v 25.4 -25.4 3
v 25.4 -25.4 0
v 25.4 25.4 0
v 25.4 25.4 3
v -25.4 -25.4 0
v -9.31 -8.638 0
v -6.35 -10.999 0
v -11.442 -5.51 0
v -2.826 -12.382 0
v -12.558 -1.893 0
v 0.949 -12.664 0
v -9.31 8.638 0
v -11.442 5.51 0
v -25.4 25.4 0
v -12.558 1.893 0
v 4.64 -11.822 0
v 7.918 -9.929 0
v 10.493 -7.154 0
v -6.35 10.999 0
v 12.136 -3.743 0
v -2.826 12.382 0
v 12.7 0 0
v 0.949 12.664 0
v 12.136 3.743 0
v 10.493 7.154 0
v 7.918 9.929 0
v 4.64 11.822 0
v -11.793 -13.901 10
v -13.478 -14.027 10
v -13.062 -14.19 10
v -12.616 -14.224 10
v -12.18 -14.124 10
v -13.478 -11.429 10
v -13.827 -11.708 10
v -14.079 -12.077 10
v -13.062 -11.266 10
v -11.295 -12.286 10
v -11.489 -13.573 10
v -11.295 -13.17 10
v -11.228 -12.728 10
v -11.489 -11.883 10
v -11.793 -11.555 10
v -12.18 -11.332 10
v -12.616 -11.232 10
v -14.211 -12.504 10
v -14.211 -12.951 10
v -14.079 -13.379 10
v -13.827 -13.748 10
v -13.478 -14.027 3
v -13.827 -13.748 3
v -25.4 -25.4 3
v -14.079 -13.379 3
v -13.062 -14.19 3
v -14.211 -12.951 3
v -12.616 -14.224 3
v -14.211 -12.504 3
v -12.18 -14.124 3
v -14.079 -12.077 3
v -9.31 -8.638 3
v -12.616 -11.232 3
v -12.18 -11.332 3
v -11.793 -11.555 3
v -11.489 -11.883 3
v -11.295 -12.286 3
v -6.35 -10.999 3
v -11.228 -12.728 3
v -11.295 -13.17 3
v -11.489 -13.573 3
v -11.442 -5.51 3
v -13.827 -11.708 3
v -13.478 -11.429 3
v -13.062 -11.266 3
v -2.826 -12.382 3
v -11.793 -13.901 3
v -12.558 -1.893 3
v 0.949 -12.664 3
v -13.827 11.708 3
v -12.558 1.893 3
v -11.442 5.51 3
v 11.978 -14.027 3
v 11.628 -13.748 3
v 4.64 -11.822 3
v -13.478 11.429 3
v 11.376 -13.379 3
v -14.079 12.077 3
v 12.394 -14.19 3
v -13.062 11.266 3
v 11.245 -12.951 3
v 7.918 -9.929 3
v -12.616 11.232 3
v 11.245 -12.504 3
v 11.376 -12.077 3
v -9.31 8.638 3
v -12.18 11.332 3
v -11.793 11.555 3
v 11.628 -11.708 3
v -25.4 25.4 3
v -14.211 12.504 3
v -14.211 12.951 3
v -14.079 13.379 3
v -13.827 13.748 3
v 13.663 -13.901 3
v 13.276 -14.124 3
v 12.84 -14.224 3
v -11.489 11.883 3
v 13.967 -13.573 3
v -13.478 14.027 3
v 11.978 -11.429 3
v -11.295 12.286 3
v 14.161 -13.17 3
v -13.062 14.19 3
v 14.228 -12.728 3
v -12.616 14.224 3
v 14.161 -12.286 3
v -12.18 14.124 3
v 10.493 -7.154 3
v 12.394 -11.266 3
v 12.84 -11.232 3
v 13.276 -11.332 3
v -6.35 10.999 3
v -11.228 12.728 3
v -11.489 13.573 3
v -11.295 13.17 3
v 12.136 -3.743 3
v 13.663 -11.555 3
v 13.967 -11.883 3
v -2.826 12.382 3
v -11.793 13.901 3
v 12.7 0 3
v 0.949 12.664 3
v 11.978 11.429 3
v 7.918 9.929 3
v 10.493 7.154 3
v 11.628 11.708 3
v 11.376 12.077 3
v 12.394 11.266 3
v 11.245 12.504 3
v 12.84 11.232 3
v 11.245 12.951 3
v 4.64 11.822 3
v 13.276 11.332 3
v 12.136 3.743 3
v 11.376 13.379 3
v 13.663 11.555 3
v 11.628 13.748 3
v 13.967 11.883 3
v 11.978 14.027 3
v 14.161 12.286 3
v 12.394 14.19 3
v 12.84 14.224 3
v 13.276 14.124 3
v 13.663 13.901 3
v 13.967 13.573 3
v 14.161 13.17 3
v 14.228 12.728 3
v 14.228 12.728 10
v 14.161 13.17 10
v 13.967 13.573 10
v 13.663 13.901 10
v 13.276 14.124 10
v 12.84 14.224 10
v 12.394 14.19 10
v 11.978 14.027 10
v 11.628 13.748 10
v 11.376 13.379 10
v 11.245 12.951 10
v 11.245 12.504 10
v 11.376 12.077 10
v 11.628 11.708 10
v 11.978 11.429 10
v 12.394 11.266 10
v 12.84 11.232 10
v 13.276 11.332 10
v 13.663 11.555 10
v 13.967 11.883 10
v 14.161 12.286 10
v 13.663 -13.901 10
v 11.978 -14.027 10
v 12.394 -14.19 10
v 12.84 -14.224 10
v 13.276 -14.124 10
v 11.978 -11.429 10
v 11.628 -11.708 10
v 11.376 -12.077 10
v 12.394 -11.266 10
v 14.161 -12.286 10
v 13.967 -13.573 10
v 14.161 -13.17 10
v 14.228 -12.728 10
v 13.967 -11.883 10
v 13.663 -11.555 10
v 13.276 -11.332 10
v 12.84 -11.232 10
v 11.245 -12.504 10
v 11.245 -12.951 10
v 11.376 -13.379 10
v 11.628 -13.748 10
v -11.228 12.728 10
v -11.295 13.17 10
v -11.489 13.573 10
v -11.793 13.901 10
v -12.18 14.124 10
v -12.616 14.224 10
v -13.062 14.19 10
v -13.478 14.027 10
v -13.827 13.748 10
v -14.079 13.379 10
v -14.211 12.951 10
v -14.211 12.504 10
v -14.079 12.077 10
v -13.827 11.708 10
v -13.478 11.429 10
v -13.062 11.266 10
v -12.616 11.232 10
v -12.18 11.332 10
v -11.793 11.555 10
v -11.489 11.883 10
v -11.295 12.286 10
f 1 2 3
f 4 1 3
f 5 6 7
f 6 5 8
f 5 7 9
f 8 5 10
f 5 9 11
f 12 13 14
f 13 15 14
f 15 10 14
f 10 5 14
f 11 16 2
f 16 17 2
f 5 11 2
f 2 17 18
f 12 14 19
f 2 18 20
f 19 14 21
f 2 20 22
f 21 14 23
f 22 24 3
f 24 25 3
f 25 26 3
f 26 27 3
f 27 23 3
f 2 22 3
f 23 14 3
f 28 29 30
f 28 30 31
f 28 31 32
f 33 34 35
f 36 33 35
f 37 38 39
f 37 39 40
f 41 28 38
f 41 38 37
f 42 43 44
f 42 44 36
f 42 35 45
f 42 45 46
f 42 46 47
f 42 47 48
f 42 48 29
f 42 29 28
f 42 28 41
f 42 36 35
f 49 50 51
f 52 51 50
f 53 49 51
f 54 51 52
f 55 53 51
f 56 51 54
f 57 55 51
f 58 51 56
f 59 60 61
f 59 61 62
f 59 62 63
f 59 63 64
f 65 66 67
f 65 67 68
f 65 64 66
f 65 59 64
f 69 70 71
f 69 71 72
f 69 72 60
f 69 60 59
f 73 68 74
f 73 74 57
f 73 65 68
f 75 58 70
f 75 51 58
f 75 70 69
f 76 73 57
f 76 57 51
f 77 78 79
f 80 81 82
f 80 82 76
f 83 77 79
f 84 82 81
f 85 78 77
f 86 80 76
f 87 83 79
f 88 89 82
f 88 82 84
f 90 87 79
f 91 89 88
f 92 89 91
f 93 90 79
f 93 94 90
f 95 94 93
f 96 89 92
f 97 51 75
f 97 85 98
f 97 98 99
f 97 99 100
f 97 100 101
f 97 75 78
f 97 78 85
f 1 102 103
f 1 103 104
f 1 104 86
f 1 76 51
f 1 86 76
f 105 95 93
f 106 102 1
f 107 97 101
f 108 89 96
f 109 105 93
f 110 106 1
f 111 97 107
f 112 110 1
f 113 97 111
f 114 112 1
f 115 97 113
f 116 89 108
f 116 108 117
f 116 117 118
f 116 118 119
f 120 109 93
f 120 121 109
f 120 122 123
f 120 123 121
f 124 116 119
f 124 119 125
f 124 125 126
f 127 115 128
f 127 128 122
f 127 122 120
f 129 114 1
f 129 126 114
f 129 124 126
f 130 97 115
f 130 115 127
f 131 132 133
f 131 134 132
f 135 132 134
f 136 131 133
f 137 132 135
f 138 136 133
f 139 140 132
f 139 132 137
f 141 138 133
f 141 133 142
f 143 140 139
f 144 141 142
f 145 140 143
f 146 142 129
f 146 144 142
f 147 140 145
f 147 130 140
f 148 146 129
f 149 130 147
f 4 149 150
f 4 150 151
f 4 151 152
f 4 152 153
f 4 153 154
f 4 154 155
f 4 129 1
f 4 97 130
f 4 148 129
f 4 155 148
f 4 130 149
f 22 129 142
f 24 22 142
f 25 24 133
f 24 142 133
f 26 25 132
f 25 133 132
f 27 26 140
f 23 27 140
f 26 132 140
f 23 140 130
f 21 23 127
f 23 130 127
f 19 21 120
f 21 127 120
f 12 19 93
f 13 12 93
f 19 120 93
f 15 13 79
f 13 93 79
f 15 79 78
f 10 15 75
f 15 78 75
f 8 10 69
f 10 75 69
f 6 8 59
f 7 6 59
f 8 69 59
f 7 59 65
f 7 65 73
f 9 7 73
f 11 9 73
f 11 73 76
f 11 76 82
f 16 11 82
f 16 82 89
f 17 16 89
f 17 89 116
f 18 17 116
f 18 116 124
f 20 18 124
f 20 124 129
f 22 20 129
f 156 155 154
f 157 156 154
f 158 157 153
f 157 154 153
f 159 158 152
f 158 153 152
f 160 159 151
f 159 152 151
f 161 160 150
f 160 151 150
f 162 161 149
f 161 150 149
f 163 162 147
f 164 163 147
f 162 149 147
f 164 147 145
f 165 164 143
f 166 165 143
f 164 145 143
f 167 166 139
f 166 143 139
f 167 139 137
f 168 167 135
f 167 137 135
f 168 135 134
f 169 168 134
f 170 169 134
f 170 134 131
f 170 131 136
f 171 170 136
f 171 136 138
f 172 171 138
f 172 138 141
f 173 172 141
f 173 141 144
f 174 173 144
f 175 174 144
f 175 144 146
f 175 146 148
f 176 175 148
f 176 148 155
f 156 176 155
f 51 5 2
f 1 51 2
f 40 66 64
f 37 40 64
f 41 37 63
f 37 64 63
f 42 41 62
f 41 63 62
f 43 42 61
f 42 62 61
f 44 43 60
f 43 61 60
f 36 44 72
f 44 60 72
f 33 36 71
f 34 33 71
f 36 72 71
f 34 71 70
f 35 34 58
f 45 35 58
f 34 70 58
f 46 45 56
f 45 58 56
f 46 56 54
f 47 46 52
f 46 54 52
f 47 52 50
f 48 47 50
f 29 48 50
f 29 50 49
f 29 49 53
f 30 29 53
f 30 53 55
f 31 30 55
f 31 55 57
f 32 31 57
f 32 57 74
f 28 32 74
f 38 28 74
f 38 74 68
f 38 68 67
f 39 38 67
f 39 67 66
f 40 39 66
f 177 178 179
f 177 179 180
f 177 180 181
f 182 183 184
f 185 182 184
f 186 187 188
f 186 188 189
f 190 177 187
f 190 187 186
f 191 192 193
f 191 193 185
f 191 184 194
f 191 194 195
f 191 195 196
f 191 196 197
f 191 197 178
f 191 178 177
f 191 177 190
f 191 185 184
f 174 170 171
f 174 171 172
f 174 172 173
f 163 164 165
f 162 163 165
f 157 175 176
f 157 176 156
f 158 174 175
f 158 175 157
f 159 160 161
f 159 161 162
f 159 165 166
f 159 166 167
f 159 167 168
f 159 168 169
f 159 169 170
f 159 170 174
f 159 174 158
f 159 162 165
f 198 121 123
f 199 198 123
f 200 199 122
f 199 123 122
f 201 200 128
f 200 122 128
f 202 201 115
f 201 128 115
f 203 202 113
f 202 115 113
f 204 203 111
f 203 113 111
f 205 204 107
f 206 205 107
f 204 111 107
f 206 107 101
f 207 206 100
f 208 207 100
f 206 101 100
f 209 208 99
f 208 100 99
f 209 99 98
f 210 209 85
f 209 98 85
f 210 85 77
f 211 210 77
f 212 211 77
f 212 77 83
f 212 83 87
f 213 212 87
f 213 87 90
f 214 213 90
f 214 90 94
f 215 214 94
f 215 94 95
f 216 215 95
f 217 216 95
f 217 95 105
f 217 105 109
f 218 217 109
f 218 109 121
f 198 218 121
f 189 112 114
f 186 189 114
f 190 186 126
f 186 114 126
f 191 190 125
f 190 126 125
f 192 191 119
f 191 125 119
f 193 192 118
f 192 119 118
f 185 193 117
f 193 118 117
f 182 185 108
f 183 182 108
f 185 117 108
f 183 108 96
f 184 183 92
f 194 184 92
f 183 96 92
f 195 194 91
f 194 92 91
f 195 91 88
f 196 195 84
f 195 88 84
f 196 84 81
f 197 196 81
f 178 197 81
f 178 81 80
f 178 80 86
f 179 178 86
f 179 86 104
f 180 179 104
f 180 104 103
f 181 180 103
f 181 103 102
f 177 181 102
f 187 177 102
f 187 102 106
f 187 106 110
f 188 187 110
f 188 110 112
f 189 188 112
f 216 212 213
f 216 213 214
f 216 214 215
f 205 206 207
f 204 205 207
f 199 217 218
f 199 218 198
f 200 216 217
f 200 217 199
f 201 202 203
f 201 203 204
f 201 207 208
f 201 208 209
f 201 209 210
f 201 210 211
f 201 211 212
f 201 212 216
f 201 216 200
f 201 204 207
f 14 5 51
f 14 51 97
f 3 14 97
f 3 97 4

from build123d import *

# Parameters (mm, degrees)
F0_W     = 50.8
F0_H     = 50.8
F1_DEPTH = 3
F2_R     = 1.5
F3_DEPTH = 10
F4_R     = 12.7
F5_DEPTH = 25.4


with BuildPart() as f1:
    # F0 (on Top) → F1 (new body)
    with BuildSketch(Plane.XY):
        Rectangle(F0_W, F0_H)
    extrude(amount=F1_DEPTH)

    # F2 (on Top) → F3 (join)
    with BuildSketch(Plane.XY):
        with Locations((-12.727922, 12.727922)):
            Circle(F2_R)
        with Locations((-12.727922, -12.727922)):
            Circle(F2_R)
        with Locations((12.727922, -12.727922)):
            Circle(F2_R)
        with Locations((12.727922, 12.727922)):
            Circle(F2_R)
    extrude(amount=F3_DEPTH)

    # F4 (on face) → F5 (cut)
    with BuildSketch(Plane.XY.offset(3)):
        Circle(F4_R)
    extrude(amount=-F5_DEPTH, mode=Mode.SUBTRACT)


solid = f1.part
